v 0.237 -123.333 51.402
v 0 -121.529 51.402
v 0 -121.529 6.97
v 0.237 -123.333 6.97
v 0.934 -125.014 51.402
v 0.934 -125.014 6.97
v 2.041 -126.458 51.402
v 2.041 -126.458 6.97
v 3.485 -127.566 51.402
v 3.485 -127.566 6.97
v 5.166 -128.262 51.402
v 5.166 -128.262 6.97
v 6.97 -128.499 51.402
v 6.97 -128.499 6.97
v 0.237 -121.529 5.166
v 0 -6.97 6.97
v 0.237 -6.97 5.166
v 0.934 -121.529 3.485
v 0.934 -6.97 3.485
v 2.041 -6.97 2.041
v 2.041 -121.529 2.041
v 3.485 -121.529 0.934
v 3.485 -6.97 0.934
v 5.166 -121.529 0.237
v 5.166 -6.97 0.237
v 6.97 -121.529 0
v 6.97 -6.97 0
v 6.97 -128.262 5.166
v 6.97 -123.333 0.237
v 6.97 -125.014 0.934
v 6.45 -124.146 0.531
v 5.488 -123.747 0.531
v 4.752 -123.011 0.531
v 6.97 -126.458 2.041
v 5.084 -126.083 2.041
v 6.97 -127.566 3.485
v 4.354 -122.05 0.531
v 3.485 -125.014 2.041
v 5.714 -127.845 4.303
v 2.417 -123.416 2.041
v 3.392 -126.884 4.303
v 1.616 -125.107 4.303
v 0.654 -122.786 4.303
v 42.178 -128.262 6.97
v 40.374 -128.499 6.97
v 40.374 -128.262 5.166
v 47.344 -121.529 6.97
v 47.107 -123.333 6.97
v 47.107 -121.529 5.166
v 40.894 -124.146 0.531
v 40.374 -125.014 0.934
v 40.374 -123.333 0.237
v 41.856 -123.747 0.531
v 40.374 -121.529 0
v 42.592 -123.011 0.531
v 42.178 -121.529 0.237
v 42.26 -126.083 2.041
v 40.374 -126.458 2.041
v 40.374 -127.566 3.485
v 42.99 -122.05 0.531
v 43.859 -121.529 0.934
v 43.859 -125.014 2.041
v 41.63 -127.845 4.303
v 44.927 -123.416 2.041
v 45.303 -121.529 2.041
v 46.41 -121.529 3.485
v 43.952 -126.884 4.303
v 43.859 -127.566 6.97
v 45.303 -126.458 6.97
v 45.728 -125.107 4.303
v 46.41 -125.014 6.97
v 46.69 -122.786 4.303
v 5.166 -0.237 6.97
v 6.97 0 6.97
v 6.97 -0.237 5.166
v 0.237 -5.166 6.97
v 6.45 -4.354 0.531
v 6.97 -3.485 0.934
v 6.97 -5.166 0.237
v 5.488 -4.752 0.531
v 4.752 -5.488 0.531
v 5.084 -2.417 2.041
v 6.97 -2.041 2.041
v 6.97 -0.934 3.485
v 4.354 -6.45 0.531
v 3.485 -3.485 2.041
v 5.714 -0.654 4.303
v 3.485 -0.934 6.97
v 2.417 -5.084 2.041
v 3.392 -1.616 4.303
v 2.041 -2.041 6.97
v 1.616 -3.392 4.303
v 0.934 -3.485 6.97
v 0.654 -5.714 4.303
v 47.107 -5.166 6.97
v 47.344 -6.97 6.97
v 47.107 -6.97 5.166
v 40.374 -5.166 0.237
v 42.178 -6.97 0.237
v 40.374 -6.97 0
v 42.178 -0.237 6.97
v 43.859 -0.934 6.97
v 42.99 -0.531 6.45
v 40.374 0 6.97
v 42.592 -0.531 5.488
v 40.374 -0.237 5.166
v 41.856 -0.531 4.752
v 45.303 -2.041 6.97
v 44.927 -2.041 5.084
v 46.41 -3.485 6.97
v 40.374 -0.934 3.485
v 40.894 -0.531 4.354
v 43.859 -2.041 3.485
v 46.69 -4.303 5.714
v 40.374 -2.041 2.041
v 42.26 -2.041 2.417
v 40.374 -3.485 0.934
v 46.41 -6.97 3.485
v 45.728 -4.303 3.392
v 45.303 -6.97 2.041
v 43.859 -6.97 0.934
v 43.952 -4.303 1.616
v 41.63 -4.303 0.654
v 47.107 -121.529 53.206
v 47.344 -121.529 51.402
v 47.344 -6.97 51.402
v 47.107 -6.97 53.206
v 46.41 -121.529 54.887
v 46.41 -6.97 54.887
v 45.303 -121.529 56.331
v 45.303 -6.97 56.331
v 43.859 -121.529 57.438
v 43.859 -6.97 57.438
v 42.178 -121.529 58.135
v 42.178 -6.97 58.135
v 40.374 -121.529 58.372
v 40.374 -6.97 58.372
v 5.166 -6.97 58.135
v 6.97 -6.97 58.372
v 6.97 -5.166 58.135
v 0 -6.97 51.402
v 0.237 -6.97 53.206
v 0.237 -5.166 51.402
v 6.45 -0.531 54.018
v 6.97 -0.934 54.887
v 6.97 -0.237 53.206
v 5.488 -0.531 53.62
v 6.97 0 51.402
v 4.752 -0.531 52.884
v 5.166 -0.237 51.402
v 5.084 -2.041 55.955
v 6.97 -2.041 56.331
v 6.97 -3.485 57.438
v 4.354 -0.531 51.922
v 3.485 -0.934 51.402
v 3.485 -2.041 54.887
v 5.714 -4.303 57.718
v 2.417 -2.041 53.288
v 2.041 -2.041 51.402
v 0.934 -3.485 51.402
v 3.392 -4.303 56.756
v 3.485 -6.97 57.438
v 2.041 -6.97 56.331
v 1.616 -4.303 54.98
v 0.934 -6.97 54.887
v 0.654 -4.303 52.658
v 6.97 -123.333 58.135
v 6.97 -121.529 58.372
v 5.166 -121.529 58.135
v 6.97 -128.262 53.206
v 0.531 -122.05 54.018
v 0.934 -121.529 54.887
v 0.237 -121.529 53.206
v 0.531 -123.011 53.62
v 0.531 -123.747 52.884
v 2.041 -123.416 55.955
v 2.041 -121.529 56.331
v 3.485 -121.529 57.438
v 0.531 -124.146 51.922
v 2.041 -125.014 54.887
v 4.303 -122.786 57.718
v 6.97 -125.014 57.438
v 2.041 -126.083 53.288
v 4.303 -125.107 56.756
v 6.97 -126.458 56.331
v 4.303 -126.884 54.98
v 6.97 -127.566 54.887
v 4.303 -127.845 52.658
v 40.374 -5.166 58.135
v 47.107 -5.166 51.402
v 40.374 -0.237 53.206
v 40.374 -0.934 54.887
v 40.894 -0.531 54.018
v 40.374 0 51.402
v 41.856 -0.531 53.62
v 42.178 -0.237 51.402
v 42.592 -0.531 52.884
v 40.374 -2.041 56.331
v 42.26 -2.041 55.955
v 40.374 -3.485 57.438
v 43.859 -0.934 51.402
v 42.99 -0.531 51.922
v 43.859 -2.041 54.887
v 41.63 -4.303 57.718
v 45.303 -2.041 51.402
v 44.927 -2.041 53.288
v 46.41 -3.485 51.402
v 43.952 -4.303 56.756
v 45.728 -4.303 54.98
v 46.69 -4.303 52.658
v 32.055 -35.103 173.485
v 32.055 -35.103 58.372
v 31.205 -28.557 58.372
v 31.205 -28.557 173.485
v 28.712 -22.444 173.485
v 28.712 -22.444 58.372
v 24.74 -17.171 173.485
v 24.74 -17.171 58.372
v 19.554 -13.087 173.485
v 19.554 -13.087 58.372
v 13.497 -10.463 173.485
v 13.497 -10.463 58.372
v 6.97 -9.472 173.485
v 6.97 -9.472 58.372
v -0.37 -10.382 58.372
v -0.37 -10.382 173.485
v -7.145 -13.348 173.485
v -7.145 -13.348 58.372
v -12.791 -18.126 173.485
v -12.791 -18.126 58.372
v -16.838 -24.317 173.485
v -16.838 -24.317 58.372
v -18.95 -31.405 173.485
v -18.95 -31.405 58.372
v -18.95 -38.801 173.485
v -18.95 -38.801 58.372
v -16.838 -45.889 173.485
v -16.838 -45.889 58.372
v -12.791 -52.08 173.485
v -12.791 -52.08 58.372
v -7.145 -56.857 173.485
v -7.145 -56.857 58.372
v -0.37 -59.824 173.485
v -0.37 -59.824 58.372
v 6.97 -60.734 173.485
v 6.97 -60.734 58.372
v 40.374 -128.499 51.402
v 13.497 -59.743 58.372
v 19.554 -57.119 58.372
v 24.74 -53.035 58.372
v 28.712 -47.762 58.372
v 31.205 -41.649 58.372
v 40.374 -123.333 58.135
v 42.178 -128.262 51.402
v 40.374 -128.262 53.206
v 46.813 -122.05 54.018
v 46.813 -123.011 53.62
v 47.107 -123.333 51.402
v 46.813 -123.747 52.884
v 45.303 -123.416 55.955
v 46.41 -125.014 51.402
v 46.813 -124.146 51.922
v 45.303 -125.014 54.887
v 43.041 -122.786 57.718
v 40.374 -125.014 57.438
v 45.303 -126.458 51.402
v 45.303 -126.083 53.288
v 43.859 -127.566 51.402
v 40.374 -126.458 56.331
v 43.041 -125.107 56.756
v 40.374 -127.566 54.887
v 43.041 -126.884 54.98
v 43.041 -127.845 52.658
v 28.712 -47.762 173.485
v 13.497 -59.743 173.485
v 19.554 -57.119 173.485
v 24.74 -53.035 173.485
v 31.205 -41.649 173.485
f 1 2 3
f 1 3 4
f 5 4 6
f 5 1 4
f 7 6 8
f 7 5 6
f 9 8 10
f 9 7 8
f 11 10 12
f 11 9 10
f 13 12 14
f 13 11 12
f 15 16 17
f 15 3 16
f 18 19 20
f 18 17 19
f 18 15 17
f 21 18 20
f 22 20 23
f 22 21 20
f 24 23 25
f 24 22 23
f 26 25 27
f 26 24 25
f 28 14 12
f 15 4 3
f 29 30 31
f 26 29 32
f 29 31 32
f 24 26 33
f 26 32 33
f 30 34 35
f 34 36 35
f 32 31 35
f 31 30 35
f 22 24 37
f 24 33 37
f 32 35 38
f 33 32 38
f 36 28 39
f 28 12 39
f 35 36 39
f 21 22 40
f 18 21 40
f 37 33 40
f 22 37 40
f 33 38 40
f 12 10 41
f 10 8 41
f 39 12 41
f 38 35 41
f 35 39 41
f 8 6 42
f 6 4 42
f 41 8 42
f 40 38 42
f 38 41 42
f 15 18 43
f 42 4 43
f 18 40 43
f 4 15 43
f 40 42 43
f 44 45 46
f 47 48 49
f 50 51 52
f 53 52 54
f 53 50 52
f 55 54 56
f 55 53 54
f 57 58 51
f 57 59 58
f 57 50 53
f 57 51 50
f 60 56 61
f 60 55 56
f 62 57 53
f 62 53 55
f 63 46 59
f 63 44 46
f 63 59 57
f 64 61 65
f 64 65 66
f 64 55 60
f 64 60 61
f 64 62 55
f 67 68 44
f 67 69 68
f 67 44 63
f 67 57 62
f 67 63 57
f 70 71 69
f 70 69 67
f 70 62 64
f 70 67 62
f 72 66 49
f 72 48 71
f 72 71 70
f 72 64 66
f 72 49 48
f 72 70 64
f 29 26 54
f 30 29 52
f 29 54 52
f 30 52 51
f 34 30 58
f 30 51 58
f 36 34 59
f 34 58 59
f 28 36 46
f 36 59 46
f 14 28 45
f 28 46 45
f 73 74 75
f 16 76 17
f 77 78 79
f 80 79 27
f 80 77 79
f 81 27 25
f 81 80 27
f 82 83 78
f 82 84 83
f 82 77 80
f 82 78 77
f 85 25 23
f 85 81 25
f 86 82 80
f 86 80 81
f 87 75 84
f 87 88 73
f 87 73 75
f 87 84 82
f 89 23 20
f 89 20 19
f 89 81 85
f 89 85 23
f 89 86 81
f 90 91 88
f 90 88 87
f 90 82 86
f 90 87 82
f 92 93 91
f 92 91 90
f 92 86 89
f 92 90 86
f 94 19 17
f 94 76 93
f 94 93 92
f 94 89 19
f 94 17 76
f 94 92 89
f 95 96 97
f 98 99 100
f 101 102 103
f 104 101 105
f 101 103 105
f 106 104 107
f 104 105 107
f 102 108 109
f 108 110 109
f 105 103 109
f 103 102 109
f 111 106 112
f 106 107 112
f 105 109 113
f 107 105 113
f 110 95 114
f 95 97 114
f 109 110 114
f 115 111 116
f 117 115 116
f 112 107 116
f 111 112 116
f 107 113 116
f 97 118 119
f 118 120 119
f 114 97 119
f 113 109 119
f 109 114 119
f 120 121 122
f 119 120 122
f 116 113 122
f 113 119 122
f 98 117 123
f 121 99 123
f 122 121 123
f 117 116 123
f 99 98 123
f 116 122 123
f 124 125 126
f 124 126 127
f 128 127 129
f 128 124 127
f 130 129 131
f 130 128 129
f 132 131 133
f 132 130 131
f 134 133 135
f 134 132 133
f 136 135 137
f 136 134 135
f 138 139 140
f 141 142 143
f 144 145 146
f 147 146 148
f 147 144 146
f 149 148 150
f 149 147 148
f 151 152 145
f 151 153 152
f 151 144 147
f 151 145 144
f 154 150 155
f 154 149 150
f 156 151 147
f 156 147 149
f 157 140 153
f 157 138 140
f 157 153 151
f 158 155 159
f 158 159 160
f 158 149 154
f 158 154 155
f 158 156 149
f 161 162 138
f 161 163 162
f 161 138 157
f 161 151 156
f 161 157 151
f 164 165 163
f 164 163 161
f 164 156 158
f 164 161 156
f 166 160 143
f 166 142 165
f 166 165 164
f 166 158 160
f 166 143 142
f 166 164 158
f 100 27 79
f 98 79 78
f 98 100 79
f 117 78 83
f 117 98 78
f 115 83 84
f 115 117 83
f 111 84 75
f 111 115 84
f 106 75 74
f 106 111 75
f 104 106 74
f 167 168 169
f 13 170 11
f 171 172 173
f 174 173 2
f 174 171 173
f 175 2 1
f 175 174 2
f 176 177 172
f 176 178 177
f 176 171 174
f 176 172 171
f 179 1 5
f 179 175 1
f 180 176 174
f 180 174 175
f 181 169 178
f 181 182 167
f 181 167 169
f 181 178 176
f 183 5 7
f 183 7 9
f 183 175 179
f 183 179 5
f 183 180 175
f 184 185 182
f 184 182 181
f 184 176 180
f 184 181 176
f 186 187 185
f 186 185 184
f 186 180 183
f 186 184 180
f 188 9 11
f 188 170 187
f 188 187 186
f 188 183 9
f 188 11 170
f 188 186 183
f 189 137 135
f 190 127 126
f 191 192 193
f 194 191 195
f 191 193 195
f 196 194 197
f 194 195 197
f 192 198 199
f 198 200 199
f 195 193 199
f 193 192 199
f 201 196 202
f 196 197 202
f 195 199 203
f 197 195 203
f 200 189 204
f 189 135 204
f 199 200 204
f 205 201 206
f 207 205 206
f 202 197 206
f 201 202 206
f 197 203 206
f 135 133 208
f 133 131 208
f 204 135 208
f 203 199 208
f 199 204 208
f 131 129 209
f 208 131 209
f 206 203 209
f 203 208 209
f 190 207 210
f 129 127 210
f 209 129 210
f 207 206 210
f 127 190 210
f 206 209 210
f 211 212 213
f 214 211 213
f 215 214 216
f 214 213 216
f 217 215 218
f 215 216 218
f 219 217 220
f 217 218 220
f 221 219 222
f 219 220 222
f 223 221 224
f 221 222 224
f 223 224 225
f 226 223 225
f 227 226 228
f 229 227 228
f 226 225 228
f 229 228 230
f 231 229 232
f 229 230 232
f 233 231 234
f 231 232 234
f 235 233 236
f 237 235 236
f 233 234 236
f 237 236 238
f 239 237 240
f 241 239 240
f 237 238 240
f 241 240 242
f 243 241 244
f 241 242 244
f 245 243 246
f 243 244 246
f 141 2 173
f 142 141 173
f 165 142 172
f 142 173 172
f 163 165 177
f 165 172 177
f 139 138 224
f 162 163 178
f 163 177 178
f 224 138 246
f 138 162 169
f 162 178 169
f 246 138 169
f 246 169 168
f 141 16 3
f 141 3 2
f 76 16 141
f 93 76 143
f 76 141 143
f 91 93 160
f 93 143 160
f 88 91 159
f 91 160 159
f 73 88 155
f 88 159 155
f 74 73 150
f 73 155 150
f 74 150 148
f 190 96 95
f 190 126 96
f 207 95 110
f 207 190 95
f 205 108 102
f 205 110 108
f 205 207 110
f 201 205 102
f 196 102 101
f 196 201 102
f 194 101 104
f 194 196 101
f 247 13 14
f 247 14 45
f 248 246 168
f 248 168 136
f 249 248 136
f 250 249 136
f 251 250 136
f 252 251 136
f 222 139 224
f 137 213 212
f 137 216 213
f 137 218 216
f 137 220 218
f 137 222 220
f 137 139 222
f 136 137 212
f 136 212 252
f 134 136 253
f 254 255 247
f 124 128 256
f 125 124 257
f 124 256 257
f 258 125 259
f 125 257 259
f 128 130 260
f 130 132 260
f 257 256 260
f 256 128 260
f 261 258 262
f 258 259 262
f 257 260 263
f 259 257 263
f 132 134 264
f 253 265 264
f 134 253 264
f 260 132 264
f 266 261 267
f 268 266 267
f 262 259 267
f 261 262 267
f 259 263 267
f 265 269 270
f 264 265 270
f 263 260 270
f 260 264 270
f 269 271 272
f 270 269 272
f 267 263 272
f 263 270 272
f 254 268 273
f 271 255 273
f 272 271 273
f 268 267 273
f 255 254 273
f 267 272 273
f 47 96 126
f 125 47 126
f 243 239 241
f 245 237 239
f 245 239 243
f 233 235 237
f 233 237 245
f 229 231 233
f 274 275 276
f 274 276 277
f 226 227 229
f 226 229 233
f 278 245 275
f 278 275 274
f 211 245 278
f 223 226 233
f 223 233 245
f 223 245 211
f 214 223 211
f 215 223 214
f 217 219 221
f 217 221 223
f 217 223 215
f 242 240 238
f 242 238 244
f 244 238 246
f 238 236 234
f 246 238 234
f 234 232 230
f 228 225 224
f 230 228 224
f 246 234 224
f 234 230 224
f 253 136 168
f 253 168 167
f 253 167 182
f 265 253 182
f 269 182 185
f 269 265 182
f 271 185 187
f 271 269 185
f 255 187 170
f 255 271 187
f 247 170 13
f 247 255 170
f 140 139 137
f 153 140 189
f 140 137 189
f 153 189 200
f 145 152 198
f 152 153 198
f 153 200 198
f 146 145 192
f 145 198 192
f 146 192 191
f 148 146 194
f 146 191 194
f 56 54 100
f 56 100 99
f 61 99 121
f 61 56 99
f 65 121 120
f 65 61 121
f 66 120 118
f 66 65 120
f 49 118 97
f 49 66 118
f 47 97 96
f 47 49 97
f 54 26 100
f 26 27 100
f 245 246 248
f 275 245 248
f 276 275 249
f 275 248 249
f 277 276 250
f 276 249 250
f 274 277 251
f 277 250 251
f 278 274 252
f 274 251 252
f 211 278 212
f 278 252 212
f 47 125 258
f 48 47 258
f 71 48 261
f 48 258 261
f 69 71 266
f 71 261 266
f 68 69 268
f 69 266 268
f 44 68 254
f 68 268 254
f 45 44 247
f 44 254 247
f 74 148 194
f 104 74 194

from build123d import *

# Parameters (mm, degrees)
F0_W     = 47.344006598
F0_H     = 58.3720691502
F1_DEPTH = 128.4994799644
F2_R     = 6.9700197205
F4_DEPTH = 115.1127442718


with BuildPart() as f1:
    # F0 (on Front) → F1 (new body)
    with BuildSketch(Plane.XZ):
        with Locations((23.672003299, 29.1860345751)):
            Rectangle(F0_W, F0_H)
    extrude(amount=F1_DEPTH)

    # F2
    f2_edges = [f1.edges().sort_by_distance(p)[0] for p in [
        (23.672003, -128.49948, 58.372069),
        (47.344007, -64.24974, 58.372069),
        (0, -64.24974, 58.372069),
        (23.672003, 0, 58.372069),
        (47.344007, -128.49948, 29.186035),
        (0, -128.49948, 29.186035),
        (23.672003, -128.49948, 0),
        (47.344007, -64.24974, 0),
        (47.344007, 0, 29.186035),
        (0, 0, 29.186035),
        (23.672003, 0, 0),
        (0, -64.24974, 0),
    ]]
    fillet(f2_edges, radius=F2_R)

    # F3 (on face) → F4 (join)
    with BuildSketch(Plane.XY.offset(58.3720691502)):
        with BuildLine():
            Line((6.9700197205, -60.7335358806), (6.9700197205, -9.472435718))
            ThreePointArc((6.9700197205, -9.472435718), (-19.2179336437, -35.1029857993), (6.9700197205, -60.7335358806))
        make_face()
        with BuildLine():
            ThreePointArc((6.9700197205, -60.7335358806), (24.7402160172, -53.03468171), (32.0550306924, -35.1029857993))
            ThreePointArc((32.0550306924, -35.1029857993), (24.7402160172, -17.1712898886), (6.9700197205, -9.472435718))
            Line((6.9700197205, -9.472435718), (6.9700197205, -60.7335358806))
        make_face()
    extrude(amount=F4_DEPTH)


solid = f1.part
